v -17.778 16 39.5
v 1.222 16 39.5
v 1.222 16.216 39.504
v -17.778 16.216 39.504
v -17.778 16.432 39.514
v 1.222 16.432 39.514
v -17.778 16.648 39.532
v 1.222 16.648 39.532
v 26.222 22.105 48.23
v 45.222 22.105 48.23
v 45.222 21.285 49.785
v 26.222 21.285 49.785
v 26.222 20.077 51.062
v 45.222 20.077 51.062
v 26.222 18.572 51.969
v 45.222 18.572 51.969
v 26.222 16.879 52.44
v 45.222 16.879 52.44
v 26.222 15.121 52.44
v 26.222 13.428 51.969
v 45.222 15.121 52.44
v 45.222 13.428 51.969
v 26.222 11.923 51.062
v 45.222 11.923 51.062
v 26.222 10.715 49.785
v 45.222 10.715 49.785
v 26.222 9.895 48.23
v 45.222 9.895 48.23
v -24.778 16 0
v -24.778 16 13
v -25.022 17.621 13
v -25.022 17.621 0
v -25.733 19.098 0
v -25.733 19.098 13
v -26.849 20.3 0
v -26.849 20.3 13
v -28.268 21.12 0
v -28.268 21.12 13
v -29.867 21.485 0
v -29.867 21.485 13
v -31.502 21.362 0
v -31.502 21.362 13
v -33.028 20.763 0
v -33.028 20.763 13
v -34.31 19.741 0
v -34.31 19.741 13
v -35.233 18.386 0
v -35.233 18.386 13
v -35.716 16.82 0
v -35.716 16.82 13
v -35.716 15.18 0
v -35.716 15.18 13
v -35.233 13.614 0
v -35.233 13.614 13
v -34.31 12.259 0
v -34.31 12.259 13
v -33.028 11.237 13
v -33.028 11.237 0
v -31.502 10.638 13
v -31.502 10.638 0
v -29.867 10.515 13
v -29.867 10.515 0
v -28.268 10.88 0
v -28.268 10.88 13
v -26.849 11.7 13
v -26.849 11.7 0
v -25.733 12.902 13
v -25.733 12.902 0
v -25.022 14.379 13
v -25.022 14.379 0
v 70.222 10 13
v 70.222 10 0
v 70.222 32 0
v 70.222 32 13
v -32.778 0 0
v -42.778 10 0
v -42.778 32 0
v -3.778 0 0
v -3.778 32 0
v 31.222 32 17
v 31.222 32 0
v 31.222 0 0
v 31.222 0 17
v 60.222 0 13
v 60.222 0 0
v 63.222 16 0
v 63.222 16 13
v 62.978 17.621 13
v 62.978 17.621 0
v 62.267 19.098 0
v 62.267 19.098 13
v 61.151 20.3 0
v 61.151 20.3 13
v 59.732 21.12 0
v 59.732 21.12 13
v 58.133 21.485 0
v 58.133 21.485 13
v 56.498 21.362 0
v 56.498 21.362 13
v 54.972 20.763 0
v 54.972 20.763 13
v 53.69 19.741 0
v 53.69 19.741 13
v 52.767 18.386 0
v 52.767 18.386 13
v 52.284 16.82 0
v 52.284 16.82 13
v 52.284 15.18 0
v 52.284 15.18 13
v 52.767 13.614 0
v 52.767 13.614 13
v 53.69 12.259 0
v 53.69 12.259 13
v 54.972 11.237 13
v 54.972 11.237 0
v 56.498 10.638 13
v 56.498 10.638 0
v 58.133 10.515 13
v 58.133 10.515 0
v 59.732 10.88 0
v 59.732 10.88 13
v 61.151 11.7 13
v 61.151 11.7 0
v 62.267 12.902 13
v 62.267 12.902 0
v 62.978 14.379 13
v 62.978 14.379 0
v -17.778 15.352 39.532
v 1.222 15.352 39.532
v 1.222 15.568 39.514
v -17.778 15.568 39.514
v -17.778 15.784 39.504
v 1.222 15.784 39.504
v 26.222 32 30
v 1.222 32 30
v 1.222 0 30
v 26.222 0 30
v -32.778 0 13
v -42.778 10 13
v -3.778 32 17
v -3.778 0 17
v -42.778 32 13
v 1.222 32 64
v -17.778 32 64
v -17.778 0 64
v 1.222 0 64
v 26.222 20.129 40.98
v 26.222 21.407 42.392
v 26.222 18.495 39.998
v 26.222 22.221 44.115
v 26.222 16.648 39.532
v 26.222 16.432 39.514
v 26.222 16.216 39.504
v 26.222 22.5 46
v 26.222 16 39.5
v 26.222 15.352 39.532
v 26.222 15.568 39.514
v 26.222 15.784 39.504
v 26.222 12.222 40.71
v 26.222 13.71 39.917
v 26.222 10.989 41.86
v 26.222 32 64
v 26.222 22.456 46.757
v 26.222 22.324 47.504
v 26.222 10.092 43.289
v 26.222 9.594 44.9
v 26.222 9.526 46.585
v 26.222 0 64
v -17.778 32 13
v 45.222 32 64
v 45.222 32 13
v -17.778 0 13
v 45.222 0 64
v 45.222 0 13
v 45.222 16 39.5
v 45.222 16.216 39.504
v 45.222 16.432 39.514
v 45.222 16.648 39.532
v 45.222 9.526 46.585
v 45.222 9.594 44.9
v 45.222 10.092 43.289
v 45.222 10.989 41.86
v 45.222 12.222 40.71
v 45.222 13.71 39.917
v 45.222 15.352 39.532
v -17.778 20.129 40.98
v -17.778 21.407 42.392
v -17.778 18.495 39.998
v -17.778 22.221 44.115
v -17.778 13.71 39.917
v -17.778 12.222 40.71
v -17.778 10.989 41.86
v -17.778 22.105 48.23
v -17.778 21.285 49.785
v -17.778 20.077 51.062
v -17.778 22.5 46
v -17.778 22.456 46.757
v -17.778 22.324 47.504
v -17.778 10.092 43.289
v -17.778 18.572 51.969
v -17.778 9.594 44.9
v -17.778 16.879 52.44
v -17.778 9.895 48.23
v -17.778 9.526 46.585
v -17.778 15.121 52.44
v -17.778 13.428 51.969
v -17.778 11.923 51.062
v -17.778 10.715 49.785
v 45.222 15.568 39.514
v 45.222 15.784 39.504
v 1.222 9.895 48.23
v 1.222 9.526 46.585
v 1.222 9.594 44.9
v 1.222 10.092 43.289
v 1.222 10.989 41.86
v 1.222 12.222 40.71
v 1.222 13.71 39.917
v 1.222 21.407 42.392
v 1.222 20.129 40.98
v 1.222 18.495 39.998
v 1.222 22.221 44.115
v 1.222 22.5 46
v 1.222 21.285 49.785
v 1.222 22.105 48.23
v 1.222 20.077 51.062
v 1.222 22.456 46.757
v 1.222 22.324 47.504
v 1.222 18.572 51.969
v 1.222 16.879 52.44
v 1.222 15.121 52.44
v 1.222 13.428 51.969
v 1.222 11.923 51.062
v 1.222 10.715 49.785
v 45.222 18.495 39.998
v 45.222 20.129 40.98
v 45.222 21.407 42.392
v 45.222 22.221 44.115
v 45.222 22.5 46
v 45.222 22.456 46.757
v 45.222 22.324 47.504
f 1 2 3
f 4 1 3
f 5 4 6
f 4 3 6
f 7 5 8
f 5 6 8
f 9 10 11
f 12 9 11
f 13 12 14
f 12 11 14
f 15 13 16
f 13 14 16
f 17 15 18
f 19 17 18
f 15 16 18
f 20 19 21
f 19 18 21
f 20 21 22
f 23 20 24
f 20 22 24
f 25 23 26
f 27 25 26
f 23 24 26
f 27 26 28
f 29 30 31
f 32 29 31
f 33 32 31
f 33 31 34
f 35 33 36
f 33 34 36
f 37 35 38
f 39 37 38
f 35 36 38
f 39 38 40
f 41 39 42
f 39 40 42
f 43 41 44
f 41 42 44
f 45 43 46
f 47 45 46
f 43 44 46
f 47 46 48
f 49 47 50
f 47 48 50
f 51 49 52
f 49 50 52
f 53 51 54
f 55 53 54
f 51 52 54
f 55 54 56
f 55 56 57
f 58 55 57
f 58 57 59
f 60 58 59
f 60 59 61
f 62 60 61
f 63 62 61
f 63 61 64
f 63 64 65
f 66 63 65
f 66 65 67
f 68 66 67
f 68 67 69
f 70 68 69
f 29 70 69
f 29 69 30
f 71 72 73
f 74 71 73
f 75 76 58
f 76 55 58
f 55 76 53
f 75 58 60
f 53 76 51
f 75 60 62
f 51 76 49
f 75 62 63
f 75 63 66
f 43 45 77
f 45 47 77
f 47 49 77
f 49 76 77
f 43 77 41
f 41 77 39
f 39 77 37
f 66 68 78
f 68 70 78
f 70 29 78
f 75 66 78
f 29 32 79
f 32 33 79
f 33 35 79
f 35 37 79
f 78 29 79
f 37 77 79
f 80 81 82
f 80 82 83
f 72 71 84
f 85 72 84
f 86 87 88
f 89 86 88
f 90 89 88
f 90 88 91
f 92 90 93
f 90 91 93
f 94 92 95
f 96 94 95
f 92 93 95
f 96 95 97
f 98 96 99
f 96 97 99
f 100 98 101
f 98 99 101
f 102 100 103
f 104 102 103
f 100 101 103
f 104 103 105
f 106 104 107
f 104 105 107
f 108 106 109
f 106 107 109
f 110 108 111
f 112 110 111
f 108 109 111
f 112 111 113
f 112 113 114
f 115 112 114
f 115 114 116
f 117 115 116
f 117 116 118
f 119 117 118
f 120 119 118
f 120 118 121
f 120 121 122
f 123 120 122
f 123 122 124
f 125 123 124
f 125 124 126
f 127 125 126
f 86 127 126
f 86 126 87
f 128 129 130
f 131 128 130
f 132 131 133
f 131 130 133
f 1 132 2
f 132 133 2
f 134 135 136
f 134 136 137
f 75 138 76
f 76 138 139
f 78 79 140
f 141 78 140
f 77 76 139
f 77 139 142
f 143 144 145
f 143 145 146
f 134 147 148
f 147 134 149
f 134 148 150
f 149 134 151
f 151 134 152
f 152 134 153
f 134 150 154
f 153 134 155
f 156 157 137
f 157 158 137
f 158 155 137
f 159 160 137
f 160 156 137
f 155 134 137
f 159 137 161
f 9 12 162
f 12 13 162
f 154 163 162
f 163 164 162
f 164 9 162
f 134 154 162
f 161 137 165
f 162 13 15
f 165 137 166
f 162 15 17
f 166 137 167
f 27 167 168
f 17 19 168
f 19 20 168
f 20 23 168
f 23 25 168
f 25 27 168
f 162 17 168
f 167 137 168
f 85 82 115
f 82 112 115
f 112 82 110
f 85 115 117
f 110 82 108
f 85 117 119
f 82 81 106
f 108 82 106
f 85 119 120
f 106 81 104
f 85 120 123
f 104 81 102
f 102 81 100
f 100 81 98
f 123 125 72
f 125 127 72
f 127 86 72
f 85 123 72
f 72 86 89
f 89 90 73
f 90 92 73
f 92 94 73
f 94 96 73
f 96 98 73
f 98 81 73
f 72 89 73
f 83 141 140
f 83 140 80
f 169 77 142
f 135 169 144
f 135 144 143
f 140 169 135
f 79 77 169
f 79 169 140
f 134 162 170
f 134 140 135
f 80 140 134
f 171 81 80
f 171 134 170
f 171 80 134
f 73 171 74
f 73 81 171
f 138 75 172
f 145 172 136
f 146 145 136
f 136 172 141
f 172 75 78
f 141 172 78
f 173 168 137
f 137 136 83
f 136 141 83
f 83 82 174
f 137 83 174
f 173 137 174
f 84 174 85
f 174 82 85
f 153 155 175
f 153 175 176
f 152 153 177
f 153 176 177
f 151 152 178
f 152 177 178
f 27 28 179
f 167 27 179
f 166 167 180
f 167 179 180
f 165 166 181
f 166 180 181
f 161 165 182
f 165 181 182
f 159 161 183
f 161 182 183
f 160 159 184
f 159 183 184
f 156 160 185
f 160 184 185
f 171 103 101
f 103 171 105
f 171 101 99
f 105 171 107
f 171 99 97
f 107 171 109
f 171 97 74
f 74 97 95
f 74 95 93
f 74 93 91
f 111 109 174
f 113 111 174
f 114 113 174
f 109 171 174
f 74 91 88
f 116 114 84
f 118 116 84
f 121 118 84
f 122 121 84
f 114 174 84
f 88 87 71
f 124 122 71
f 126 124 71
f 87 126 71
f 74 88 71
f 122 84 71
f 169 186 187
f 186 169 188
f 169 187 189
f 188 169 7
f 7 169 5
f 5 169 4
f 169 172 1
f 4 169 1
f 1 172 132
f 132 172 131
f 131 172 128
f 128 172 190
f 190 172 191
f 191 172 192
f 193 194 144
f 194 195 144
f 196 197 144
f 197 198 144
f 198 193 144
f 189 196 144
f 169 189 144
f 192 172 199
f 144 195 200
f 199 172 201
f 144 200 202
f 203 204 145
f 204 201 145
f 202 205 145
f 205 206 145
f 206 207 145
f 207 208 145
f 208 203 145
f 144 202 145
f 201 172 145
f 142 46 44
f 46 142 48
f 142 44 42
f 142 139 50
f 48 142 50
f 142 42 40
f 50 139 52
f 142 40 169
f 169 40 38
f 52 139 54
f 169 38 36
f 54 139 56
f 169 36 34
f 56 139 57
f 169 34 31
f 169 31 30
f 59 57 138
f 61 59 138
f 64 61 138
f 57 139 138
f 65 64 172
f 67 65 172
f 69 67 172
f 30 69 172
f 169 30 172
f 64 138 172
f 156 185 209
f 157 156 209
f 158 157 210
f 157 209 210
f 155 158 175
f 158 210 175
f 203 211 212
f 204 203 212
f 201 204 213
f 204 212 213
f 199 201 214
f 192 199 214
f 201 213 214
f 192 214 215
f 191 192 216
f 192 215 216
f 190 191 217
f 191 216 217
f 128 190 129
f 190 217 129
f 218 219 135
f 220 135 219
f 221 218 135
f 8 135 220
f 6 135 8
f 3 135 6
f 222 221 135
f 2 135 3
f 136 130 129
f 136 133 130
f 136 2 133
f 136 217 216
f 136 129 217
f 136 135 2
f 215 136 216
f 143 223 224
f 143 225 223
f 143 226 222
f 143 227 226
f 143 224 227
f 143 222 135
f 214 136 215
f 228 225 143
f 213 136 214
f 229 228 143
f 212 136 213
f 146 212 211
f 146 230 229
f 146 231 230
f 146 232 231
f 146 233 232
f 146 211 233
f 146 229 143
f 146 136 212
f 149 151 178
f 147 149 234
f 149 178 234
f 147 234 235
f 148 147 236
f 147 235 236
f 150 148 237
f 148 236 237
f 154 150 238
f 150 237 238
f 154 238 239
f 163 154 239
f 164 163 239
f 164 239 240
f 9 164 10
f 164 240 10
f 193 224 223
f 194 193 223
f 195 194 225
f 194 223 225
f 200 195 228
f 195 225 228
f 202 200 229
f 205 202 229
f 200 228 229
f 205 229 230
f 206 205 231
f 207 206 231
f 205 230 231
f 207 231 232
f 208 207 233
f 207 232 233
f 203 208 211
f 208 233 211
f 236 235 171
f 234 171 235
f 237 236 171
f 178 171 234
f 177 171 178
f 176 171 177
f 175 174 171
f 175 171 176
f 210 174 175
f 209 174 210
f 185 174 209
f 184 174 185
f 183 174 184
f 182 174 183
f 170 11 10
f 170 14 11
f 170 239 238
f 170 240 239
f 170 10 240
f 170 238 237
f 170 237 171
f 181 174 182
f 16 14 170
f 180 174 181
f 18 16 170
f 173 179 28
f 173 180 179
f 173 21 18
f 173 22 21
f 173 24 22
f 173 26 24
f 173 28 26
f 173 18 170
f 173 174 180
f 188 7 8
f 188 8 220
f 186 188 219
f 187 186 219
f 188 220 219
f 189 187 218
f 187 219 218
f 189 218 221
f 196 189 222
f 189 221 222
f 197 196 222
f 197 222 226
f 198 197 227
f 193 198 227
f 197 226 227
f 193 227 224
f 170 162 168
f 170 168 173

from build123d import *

# Parameters (mm, degrees)
F0_W     = 113
F0_H     = 32
F1_DEPTH = 64
F2_W     = 25
F2_H     = 51
F2_H_2   = 34
F2_W_2   = 35
F2_H_3   = 17
F3_DEPTH = 32.001
F5_R     = 5.5
F4_R     = 5.5
F7_DEPTH = 25
F8_DEPTH = 88.001


with BuildPart() as f1:
    # F0 (on Top) → F1 (new body)
    with BuildSketch(Plane.XY):
        with Locations((13.7222270072, 16)):
            Rectangle(F0_W, F0_H)
    extrude(amount=F1_DEPTH)

    # F2 (on face) → F3 (cut, through all)
    with BuildSketch(Plane.XZ):
        with Locations((-30.2777729928, 38.5)):
            Rectangle(F2_W, F2_H)
        with Locations((13.7222270072, 47)):
            Rectangle(F2_W, F2_H_2)
        with Locations((13.7222270072, 8.5)):
            Rectangle(F2_W_2, F2_H_3)
        with Locations((57.7222270072, 38.5)):
            Rectangle(F2_W, F2_H)
    extrude(amount=-F3_DEPTH, mode=Mode.SUBTRACT)

    # F5 (on face) + F4 (on face) → F7 (cut)
    with BuildSketch(Plane.XY.offset(13)):
        with Locations((57.7222270072, 16)):
            Circle(F5_R)
        Polygon((60.2222270072, 0), (70.2222270072, 0), (70.2222270072, 10), align=None)
    with BuildSketch(Plane.XY.offset(13)):
        with Locations((-30.2777729928, 16)):
            Circle(F4_R)
        Polygon((-42.7777729928, 10), (-42.7777729928, 0), (-32.7777729928, 0), align=None)
    extrude(amount=-F7_DEPTH, mode=Mode.SUBTRACT)

    # F6 (on face) → F8 (cut, through all)
    with BuildSketch(Plane.YZ.offset(45.2222270072)):
        with BuildLine():
            Line((9.8946494696, 48.2304024078), (15.3522470821, 39.5323562129))
            ThreePointArc((15.3522470821, 39.5323562129), (15.6757197327, 39.5080940928), (16, 39.5))
            ThreePointArc((16, 39.5), (16.3242802673, 39.5080940928), (16.6477529179, 39.5323562129))
            Line((16.6477529179, 39.5323562129), (22.1053505304, 48.2304024078))
            ThreePointArc((22.1053505304, 48.2304024078), (16, 52.5), (9.8946494696, 48.2304024078))
        make_face()
        with BuildLine():
            ThreePointArc((9.8946494696, 48.2304024078), (10.4940846857, 42.5453080381), (15.3522470821, 39.5323562129))
            Line((15.3522470821, 39.5323562129), (9.8946494696, 48.2304024078))
        make_face()
        with BuildLine():
            Line((22.1053505304, 48.2304024078), (16.6477529179, 39.5323562129))
            ThreePointArc((16.6477529179, 39.5323562129), (20.8197714659, 41.6388300862), (22.5, 46))
            ThreePointArc((22.5, 46), (22.4005772571, 47.1325240731), (22.1053505304, 48.2304024078))
        make_face()
    extrude(amount=-F8_DEPTH, mode=Mode.SUBTRACT)


solid = f1.part
